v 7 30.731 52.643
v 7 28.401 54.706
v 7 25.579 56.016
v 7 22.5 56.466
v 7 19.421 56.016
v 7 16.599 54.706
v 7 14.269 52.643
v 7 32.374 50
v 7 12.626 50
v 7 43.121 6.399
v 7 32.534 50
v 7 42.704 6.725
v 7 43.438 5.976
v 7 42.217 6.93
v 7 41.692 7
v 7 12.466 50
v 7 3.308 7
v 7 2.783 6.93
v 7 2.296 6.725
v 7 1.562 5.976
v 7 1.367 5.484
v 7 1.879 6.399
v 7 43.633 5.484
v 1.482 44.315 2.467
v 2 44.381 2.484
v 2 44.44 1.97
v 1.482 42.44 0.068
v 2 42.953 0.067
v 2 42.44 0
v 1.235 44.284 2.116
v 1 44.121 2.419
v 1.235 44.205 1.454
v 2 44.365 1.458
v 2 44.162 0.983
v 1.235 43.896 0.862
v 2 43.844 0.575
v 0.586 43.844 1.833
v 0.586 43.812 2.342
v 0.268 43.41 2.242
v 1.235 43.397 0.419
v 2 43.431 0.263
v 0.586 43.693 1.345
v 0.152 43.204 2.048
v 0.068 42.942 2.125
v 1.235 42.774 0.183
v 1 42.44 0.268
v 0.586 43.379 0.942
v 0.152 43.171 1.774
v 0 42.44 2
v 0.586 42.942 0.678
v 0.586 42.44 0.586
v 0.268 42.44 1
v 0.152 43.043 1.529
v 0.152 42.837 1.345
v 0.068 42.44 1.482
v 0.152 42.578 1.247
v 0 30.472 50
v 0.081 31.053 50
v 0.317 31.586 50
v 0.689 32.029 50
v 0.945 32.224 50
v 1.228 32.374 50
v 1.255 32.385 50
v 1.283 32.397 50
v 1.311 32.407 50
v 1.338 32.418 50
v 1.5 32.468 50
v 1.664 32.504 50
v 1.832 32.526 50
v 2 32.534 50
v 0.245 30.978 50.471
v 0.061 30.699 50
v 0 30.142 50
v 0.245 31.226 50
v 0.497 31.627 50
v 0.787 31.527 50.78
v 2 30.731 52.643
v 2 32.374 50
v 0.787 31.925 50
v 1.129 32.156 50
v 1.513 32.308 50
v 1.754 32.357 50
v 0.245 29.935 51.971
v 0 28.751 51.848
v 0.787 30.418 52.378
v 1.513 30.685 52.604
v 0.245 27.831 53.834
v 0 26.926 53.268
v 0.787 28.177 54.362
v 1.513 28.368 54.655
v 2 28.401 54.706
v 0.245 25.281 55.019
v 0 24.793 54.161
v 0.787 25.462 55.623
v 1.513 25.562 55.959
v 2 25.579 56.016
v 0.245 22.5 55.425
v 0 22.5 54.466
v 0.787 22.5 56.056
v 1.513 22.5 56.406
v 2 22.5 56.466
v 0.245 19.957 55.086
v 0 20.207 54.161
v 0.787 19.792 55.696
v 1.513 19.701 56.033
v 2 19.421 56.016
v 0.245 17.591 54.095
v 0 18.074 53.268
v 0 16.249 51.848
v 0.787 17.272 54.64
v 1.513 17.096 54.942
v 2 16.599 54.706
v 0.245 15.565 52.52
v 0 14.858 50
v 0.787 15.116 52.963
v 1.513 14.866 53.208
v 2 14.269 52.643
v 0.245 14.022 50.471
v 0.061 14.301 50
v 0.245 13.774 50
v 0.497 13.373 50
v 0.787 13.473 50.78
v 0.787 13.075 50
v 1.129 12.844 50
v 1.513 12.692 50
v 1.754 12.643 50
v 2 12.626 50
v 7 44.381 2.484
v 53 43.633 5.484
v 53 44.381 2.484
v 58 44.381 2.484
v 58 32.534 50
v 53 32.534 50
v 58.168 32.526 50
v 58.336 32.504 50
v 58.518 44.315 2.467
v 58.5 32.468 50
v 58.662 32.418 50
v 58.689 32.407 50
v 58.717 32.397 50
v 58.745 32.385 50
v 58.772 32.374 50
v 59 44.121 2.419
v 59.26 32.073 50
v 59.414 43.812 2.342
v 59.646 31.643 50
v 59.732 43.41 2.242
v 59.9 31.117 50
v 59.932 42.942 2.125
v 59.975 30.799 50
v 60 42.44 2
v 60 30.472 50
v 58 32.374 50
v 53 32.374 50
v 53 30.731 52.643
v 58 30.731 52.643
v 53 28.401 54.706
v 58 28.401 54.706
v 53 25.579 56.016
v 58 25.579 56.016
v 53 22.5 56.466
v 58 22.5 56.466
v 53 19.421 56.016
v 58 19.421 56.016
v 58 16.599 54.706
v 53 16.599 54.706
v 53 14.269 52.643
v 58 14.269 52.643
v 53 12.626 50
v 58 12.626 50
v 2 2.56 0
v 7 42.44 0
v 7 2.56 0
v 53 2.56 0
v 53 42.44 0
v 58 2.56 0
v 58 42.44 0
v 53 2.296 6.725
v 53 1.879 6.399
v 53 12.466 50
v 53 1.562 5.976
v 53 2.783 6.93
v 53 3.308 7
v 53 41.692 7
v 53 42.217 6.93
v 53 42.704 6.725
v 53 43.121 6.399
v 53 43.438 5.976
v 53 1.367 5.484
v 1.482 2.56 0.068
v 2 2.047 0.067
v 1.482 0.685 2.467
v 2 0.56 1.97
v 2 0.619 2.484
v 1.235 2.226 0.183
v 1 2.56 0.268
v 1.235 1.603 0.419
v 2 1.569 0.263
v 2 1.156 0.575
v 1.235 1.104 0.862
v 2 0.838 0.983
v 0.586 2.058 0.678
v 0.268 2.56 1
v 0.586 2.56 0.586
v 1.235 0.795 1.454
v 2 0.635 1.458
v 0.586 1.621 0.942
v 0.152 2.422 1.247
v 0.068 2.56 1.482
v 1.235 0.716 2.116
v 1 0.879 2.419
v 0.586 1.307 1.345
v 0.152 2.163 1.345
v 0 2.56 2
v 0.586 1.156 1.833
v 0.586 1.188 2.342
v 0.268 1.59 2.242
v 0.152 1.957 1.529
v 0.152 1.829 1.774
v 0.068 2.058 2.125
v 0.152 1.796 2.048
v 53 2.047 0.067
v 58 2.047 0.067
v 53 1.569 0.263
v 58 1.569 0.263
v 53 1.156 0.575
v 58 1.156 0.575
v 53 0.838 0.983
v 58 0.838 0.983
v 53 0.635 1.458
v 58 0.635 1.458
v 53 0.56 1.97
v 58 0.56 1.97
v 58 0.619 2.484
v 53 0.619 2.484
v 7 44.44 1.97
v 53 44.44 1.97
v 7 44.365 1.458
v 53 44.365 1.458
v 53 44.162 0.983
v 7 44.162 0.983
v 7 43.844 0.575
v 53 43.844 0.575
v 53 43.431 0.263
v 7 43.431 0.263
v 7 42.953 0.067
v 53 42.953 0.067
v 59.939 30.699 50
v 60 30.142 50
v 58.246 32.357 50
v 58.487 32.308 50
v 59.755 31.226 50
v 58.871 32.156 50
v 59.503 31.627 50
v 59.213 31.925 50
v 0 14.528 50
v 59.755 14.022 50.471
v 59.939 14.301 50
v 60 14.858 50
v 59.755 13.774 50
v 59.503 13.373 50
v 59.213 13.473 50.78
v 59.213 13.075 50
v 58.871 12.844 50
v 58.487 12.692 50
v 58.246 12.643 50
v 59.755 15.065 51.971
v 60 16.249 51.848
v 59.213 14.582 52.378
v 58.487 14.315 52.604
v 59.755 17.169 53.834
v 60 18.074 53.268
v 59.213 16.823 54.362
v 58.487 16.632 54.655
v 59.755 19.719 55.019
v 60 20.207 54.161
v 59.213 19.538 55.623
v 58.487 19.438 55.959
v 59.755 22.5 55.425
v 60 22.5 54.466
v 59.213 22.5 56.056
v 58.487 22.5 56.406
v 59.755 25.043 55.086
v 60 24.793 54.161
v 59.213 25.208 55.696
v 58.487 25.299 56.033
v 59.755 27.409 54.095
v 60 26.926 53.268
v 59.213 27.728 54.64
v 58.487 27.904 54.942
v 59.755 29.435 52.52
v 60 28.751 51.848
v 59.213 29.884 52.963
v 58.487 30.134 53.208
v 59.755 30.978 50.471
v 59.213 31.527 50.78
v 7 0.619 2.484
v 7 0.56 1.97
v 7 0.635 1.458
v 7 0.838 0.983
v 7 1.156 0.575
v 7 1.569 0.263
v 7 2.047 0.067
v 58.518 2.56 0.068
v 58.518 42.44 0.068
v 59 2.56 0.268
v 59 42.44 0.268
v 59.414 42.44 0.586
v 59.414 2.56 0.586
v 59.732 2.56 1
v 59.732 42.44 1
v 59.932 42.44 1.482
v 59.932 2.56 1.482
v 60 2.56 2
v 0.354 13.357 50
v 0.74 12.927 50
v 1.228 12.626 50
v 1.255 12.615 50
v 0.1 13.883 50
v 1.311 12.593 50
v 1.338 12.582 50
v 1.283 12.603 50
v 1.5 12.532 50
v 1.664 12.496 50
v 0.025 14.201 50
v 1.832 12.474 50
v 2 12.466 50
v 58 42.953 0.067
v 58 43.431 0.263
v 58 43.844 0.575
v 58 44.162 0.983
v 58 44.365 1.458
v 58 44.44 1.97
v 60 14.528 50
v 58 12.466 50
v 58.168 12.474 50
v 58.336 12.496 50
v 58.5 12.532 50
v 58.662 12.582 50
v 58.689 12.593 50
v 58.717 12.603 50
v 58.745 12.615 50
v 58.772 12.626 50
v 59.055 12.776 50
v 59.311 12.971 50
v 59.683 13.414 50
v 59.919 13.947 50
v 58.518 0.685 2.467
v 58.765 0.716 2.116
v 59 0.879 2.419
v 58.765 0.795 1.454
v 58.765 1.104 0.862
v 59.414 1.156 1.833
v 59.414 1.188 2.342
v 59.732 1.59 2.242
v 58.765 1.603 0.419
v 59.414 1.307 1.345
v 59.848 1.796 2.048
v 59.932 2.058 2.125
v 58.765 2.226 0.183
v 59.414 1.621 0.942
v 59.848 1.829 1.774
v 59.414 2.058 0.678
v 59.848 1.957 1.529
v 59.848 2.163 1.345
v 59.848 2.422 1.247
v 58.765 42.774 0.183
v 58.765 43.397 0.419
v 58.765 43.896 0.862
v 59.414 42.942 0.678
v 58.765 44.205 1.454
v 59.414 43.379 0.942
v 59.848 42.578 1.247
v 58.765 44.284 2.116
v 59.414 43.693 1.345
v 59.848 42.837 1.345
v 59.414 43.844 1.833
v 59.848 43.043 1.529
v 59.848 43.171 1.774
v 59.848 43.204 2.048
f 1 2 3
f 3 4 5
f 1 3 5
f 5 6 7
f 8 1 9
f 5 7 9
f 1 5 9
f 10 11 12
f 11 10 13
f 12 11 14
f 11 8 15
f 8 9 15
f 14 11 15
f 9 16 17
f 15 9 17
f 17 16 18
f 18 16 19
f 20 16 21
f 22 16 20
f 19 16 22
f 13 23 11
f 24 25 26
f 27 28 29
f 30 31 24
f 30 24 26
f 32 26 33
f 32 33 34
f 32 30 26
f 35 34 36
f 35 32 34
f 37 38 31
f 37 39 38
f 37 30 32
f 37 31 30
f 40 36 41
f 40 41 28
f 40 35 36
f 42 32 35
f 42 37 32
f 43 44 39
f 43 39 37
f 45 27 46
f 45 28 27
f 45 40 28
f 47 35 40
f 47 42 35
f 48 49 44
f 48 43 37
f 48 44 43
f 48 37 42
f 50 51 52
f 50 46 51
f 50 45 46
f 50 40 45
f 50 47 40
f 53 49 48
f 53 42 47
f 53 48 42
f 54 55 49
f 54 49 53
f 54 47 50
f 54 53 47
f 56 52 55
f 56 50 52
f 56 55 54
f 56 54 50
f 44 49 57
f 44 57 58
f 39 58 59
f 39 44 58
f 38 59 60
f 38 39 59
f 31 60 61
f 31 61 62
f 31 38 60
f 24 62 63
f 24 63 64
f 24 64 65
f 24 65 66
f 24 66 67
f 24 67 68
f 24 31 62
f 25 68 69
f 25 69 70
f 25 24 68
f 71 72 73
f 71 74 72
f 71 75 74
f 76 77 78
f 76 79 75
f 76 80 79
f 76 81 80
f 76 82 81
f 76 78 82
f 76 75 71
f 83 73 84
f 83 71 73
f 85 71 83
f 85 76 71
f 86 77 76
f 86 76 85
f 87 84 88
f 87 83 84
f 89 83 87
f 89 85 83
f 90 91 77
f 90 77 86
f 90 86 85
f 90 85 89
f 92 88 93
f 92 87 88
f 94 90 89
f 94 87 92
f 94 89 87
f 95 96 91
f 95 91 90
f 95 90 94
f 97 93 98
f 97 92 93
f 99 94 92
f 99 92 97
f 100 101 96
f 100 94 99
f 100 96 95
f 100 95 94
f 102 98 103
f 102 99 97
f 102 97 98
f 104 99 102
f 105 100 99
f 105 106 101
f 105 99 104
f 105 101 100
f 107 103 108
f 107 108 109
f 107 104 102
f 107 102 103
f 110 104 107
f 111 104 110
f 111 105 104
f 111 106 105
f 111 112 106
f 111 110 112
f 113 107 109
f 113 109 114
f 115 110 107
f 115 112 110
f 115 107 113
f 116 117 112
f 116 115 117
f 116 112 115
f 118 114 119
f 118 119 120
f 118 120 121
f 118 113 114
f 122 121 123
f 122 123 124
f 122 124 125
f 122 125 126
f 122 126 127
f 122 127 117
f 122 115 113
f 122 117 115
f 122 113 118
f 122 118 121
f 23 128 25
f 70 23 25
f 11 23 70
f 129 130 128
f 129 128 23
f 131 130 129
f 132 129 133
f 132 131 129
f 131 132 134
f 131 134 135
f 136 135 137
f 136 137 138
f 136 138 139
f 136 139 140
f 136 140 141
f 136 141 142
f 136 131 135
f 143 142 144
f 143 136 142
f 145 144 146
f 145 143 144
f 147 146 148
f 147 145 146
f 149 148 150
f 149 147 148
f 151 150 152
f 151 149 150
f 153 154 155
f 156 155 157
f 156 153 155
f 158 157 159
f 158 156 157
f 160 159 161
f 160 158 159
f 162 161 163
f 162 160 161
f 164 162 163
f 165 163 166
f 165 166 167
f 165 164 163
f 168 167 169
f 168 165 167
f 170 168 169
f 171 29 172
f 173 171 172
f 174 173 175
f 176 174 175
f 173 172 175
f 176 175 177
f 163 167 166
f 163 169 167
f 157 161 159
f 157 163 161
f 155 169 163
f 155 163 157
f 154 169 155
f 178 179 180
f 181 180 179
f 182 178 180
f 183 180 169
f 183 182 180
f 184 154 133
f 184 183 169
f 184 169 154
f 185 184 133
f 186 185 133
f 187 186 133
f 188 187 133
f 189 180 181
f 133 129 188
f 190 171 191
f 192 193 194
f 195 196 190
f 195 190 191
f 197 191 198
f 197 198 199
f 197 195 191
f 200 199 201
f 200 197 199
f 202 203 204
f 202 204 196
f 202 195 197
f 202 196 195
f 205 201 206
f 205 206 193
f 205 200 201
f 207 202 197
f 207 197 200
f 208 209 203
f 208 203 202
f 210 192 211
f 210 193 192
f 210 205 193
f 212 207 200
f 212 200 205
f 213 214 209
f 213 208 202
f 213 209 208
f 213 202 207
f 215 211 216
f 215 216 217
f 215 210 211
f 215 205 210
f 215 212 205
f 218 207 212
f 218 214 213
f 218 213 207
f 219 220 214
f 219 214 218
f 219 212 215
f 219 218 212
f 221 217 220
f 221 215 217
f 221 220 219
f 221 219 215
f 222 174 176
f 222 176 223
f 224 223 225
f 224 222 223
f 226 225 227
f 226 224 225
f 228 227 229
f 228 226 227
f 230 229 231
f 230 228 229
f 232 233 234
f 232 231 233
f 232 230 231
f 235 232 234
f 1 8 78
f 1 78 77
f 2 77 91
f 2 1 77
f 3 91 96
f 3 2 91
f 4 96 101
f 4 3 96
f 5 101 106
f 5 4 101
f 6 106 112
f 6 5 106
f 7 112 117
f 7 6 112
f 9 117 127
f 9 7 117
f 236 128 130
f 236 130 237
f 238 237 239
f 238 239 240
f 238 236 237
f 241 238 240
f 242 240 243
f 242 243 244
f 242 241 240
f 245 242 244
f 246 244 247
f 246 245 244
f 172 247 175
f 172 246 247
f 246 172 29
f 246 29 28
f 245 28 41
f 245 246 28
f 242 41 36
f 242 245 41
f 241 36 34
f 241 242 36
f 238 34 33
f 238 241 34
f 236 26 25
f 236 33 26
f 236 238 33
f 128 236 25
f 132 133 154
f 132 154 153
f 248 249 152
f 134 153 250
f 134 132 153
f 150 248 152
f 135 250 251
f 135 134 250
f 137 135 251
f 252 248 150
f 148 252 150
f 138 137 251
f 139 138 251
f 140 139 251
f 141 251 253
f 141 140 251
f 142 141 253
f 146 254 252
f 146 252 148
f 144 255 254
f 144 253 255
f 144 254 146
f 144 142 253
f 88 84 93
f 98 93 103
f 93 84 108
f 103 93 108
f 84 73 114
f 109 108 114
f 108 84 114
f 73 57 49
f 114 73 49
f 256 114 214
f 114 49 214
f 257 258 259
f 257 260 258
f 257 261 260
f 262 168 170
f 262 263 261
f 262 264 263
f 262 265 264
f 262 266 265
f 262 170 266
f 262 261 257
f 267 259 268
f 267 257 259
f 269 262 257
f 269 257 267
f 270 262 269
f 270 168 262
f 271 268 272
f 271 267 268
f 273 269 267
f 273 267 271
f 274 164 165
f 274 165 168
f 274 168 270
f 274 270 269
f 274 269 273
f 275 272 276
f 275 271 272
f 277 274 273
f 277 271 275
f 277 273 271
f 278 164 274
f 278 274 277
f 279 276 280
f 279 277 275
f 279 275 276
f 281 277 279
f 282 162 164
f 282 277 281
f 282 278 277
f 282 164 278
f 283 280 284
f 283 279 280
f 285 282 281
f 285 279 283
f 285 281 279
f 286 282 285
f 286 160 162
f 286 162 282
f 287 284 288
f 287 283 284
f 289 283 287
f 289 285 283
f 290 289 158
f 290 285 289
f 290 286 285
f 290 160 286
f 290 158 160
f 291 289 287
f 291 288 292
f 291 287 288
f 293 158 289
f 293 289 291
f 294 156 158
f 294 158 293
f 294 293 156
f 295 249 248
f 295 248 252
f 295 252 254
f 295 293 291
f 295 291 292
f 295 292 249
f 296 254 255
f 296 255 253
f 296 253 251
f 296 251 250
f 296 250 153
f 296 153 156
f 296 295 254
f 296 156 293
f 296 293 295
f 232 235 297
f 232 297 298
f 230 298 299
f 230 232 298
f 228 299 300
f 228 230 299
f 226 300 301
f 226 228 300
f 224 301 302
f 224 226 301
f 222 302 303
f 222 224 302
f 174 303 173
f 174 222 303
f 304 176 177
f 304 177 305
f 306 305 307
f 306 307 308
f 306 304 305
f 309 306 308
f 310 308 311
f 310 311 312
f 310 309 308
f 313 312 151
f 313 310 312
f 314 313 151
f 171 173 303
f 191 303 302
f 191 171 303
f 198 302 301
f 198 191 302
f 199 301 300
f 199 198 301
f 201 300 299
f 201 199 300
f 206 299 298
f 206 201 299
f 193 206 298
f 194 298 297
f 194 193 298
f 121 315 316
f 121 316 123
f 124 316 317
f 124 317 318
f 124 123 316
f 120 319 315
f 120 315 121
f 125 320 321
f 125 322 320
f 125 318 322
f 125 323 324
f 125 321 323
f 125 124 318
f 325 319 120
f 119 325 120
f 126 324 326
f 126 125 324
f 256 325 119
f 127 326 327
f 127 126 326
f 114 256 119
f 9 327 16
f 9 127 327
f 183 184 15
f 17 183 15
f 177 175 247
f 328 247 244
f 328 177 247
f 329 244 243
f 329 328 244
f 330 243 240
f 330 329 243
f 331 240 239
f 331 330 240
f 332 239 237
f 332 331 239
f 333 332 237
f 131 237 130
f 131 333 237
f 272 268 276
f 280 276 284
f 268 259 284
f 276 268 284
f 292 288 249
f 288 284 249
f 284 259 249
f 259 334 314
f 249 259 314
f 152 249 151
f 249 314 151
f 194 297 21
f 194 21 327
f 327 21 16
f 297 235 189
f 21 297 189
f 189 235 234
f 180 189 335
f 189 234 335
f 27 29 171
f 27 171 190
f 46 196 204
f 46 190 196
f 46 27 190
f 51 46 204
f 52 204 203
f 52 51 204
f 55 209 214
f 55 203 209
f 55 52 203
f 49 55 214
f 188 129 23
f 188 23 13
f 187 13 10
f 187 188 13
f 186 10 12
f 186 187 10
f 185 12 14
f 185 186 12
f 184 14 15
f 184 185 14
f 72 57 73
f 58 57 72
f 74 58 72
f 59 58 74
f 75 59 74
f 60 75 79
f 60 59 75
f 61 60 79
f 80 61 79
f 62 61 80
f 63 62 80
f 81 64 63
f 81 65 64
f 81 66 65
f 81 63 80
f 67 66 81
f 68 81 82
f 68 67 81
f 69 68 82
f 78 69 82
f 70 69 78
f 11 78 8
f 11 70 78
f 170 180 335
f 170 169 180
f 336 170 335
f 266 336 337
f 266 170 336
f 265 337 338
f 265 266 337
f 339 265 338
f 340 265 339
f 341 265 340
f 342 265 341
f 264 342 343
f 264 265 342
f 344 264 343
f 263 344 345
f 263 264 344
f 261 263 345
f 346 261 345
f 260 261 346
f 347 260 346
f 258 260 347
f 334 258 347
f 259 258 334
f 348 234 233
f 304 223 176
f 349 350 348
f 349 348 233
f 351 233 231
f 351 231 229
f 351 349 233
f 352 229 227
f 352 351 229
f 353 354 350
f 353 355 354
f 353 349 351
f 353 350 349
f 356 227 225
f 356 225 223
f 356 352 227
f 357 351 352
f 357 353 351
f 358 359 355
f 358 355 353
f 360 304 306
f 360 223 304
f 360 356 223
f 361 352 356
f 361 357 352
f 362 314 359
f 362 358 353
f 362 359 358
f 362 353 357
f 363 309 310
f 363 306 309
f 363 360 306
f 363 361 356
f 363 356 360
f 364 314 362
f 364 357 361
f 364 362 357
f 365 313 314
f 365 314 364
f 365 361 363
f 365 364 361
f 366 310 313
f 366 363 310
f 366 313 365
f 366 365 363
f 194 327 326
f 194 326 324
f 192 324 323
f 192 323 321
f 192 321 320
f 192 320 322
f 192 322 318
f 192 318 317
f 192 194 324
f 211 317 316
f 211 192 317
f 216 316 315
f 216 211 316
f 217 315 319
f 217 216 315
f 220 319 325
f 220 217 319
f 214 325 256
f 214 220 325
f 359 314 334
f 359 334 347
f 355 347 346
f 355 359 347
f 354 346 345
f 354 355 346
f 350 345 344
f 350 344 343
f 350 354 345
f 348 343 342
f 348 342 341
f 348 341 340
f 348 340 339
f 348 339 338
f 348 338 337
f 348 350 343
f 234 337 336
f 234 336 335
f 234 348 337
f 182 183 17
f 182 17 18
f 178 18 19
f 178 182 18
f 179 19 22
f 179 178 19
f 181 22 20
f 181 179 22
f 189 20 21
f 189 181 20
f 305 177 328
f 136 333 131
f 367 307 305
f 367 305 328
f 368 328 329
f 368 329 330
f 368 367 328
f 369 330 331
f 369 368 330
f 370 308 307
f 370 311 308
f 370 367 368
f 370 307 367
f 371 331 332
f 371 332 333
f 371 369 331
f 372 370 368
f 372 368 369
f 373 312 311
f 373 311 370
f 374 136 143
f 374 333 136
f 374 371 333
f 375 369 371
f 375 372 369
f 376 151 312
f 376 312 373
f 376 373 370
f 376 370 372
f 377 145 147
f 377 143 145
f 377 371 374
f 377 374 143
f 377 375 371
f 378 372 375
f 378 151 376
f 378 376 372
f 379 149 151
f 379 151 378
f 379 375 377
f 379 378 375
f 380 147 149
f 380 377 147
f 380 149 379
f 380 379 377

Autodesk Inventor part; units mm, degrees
ref_plane "YZ Plane" through (0, 0, 0) normal (1, 0, 0) x (0, 1, 0)
ref_plane "XZ Plane" through (0, 0, 0) normal (0, 1, 0) x (-1, 0, 0)
ref_plane "XY Plane" through (0, 0, 0) normal (0, 0, 1) x (1, 0, 0)
sketch "Sketch1" plane through (0, 0, 0) normal (0, 0, 1) x (1, 0, 0)
  point P0 (0, 0)
sketch "Sketch2" plane through (0, 0, 0) normal (0, 0, 1) x (1, 0, 0)
  line L0 (0, 0) -> (60, 0)
  line L1 (60, 0) -> (60, 45)
  line L2 (60, 45) -> (0, 45)
  line L3 (0, 45) -> (0, 0)
  dimension "d0" = 60
  dimension "d1" = 45
extrude "Extrusion1" add sketch "Sketch2" along normal blind 50
sketch "Sketch3" plane through (60, 0, 0) normal (1, 0, 0) x (0, 0, -1)
  line L0 (0, 45) -> (-50, 45) projected
  line L1 (-50, 0) -> (-50, 45) projected
  line L2 (0, 0) -> (-50, 0) projected
  line L3 (0, 45) -> (-50, 32.5336)
  line L4 (0, 45) -> (51.5307, 45) construction
  line L5 (0, 0) -> (-50, 12.4664)
  line L6 (0, 0) -> (51.5307, 0) construction
  dimension "d4" = 166
  dimension "d5" = 166
extrude "Extrusion2" cut sketch "Sketch3" against normal through all
sketch "Sketch4" plane through (60, 0, 0) normal (1, 0, 0) x (0, 0, -1)
  line L0 (-50, 12.4664) -> (-50, 32.5336) projected
  circle A0 centre (-45.6937, 22.5) radius 10.7721
  point P0 (-50, 32.3739)
  point P1 (-50, 12.6261)
extrude "Extrusion3" add sketch "Sketch4" against normal blind 60 contours A0 L0 picked at (-52.7772, 22.9072)
sketch "Sketch6" plane through (0, 0, 0) normal (0, 0, -1) x (-1, 0, 0)
  line L0 (0, 0) -> (-60, 0) projected
  line L1 (-60, 45) -> (0, 45) projected
  line L2 (-7, 0) -> (-53, 0)
  line L3 (-53, 0) -> (-53, 45)
  line L4 (-53, 45) -> (-7, 45)
  line L5 (-7, 45) -> (-7, 0)
  point P0 (-7, 45)
  dimension "d10" = 46
extrude "Extrusion4" cut sketch "Sketch6" against normal through all
sketch "Sketch7" plane through (0, 0, 0) normal (0, 0, -1) x (-1, 0, 0)
  line L0 (-7, 45) -> (-7, 0) projected
  line L1 (-7, 32.5336) -> (-7, 45) projected
  line L2 (-53, 0) -> (-60, 0) projected
  line L3 (-7, 45) -> (-53, 45)
  line L4 (-53, 45) -> (-53, 0)
  line L5 (-53, 0) -> (-7, 0)
  line L6 (-7, 0) -> (-7, 45)
  point P0 (-7, 0)
extrude "Extrusion5" add sketch "Sketch7" against normal blind 7
sketch "Sketch8" plane through (60, 0, 0) normal (1, 0, 0) x (0, 0, -1)
  line L0 (0, 45) -> (-50, 32.5336) projected
  line L1 (-50, 32.3739) -> (-50, 32.5336) projected
  arc A0 (-50, 32.3739) -> (-50, 12.6261) centre (-45.6937, 22.5) ccw projected
  line L2 (-50, 12.4664) -> (-50, 12.6261) projected
  line L3 (-50, 12.4664) -> (0, 0) projected
  line L4 (0, 0) -> (0, 45) projected
sketch "Sketch9" plane through (53, 43.2547, 7) normal (1, 0, 0) x (0, 0, -1)
  line L0 (7, 1.7453) -> (0, 0) projected
  line L1 (7, 1.7453) -> (0, 1.7453) projected
  line L2 (0, 0) -> (0, 1.7453) projected
  line L3 (7, -43.2547) -> (7, 1.7453) projected
  line L4 (0, 0) -> (7, 1.7453)
  line L5 (7, 1.7453) -> (0, 1.7453)
extrude "Extrusion6" cut sketch "Sketch9" against normal through all
sketch "Sketch10" plane through (53, 0, 7) normal (1, 0, 0) x (0, 0, -1)
  line L0 (0, 1.7453) -> (7, 0) projected
  line L1 (0, 0) -> (0, 1.7453) projected
  line L2 (7, 0) -> (0, 0) projected
  line L3 (-43, 12.4664) -> (7, 0) projected
  line L4 (0, 43.2547) -> (0, 1.7453) projected
  line L5 (7, 0) -> (0, 1.7453)
  line L6 (0, 1.7453) -> (0, 0)
extrude "Extrusion7" cut sketch "Sketch10" against normal through all
fillet "Fillet1" radius 2 12 edges at (60, 6.2332, 25) (60, 22.5, 56.4658) (60, 38.7668, 25) (60, 22.5, 0) (30, 0, 0) (30, 45, 0) (0, 22.5, 0) (0, 6.2332, 25) (0, 22.5, 56.4658) (0, 38.7668, 25) (30, 43.2547, 7) (30, 1.7453, 7)
properties part number "schouder(s)"
